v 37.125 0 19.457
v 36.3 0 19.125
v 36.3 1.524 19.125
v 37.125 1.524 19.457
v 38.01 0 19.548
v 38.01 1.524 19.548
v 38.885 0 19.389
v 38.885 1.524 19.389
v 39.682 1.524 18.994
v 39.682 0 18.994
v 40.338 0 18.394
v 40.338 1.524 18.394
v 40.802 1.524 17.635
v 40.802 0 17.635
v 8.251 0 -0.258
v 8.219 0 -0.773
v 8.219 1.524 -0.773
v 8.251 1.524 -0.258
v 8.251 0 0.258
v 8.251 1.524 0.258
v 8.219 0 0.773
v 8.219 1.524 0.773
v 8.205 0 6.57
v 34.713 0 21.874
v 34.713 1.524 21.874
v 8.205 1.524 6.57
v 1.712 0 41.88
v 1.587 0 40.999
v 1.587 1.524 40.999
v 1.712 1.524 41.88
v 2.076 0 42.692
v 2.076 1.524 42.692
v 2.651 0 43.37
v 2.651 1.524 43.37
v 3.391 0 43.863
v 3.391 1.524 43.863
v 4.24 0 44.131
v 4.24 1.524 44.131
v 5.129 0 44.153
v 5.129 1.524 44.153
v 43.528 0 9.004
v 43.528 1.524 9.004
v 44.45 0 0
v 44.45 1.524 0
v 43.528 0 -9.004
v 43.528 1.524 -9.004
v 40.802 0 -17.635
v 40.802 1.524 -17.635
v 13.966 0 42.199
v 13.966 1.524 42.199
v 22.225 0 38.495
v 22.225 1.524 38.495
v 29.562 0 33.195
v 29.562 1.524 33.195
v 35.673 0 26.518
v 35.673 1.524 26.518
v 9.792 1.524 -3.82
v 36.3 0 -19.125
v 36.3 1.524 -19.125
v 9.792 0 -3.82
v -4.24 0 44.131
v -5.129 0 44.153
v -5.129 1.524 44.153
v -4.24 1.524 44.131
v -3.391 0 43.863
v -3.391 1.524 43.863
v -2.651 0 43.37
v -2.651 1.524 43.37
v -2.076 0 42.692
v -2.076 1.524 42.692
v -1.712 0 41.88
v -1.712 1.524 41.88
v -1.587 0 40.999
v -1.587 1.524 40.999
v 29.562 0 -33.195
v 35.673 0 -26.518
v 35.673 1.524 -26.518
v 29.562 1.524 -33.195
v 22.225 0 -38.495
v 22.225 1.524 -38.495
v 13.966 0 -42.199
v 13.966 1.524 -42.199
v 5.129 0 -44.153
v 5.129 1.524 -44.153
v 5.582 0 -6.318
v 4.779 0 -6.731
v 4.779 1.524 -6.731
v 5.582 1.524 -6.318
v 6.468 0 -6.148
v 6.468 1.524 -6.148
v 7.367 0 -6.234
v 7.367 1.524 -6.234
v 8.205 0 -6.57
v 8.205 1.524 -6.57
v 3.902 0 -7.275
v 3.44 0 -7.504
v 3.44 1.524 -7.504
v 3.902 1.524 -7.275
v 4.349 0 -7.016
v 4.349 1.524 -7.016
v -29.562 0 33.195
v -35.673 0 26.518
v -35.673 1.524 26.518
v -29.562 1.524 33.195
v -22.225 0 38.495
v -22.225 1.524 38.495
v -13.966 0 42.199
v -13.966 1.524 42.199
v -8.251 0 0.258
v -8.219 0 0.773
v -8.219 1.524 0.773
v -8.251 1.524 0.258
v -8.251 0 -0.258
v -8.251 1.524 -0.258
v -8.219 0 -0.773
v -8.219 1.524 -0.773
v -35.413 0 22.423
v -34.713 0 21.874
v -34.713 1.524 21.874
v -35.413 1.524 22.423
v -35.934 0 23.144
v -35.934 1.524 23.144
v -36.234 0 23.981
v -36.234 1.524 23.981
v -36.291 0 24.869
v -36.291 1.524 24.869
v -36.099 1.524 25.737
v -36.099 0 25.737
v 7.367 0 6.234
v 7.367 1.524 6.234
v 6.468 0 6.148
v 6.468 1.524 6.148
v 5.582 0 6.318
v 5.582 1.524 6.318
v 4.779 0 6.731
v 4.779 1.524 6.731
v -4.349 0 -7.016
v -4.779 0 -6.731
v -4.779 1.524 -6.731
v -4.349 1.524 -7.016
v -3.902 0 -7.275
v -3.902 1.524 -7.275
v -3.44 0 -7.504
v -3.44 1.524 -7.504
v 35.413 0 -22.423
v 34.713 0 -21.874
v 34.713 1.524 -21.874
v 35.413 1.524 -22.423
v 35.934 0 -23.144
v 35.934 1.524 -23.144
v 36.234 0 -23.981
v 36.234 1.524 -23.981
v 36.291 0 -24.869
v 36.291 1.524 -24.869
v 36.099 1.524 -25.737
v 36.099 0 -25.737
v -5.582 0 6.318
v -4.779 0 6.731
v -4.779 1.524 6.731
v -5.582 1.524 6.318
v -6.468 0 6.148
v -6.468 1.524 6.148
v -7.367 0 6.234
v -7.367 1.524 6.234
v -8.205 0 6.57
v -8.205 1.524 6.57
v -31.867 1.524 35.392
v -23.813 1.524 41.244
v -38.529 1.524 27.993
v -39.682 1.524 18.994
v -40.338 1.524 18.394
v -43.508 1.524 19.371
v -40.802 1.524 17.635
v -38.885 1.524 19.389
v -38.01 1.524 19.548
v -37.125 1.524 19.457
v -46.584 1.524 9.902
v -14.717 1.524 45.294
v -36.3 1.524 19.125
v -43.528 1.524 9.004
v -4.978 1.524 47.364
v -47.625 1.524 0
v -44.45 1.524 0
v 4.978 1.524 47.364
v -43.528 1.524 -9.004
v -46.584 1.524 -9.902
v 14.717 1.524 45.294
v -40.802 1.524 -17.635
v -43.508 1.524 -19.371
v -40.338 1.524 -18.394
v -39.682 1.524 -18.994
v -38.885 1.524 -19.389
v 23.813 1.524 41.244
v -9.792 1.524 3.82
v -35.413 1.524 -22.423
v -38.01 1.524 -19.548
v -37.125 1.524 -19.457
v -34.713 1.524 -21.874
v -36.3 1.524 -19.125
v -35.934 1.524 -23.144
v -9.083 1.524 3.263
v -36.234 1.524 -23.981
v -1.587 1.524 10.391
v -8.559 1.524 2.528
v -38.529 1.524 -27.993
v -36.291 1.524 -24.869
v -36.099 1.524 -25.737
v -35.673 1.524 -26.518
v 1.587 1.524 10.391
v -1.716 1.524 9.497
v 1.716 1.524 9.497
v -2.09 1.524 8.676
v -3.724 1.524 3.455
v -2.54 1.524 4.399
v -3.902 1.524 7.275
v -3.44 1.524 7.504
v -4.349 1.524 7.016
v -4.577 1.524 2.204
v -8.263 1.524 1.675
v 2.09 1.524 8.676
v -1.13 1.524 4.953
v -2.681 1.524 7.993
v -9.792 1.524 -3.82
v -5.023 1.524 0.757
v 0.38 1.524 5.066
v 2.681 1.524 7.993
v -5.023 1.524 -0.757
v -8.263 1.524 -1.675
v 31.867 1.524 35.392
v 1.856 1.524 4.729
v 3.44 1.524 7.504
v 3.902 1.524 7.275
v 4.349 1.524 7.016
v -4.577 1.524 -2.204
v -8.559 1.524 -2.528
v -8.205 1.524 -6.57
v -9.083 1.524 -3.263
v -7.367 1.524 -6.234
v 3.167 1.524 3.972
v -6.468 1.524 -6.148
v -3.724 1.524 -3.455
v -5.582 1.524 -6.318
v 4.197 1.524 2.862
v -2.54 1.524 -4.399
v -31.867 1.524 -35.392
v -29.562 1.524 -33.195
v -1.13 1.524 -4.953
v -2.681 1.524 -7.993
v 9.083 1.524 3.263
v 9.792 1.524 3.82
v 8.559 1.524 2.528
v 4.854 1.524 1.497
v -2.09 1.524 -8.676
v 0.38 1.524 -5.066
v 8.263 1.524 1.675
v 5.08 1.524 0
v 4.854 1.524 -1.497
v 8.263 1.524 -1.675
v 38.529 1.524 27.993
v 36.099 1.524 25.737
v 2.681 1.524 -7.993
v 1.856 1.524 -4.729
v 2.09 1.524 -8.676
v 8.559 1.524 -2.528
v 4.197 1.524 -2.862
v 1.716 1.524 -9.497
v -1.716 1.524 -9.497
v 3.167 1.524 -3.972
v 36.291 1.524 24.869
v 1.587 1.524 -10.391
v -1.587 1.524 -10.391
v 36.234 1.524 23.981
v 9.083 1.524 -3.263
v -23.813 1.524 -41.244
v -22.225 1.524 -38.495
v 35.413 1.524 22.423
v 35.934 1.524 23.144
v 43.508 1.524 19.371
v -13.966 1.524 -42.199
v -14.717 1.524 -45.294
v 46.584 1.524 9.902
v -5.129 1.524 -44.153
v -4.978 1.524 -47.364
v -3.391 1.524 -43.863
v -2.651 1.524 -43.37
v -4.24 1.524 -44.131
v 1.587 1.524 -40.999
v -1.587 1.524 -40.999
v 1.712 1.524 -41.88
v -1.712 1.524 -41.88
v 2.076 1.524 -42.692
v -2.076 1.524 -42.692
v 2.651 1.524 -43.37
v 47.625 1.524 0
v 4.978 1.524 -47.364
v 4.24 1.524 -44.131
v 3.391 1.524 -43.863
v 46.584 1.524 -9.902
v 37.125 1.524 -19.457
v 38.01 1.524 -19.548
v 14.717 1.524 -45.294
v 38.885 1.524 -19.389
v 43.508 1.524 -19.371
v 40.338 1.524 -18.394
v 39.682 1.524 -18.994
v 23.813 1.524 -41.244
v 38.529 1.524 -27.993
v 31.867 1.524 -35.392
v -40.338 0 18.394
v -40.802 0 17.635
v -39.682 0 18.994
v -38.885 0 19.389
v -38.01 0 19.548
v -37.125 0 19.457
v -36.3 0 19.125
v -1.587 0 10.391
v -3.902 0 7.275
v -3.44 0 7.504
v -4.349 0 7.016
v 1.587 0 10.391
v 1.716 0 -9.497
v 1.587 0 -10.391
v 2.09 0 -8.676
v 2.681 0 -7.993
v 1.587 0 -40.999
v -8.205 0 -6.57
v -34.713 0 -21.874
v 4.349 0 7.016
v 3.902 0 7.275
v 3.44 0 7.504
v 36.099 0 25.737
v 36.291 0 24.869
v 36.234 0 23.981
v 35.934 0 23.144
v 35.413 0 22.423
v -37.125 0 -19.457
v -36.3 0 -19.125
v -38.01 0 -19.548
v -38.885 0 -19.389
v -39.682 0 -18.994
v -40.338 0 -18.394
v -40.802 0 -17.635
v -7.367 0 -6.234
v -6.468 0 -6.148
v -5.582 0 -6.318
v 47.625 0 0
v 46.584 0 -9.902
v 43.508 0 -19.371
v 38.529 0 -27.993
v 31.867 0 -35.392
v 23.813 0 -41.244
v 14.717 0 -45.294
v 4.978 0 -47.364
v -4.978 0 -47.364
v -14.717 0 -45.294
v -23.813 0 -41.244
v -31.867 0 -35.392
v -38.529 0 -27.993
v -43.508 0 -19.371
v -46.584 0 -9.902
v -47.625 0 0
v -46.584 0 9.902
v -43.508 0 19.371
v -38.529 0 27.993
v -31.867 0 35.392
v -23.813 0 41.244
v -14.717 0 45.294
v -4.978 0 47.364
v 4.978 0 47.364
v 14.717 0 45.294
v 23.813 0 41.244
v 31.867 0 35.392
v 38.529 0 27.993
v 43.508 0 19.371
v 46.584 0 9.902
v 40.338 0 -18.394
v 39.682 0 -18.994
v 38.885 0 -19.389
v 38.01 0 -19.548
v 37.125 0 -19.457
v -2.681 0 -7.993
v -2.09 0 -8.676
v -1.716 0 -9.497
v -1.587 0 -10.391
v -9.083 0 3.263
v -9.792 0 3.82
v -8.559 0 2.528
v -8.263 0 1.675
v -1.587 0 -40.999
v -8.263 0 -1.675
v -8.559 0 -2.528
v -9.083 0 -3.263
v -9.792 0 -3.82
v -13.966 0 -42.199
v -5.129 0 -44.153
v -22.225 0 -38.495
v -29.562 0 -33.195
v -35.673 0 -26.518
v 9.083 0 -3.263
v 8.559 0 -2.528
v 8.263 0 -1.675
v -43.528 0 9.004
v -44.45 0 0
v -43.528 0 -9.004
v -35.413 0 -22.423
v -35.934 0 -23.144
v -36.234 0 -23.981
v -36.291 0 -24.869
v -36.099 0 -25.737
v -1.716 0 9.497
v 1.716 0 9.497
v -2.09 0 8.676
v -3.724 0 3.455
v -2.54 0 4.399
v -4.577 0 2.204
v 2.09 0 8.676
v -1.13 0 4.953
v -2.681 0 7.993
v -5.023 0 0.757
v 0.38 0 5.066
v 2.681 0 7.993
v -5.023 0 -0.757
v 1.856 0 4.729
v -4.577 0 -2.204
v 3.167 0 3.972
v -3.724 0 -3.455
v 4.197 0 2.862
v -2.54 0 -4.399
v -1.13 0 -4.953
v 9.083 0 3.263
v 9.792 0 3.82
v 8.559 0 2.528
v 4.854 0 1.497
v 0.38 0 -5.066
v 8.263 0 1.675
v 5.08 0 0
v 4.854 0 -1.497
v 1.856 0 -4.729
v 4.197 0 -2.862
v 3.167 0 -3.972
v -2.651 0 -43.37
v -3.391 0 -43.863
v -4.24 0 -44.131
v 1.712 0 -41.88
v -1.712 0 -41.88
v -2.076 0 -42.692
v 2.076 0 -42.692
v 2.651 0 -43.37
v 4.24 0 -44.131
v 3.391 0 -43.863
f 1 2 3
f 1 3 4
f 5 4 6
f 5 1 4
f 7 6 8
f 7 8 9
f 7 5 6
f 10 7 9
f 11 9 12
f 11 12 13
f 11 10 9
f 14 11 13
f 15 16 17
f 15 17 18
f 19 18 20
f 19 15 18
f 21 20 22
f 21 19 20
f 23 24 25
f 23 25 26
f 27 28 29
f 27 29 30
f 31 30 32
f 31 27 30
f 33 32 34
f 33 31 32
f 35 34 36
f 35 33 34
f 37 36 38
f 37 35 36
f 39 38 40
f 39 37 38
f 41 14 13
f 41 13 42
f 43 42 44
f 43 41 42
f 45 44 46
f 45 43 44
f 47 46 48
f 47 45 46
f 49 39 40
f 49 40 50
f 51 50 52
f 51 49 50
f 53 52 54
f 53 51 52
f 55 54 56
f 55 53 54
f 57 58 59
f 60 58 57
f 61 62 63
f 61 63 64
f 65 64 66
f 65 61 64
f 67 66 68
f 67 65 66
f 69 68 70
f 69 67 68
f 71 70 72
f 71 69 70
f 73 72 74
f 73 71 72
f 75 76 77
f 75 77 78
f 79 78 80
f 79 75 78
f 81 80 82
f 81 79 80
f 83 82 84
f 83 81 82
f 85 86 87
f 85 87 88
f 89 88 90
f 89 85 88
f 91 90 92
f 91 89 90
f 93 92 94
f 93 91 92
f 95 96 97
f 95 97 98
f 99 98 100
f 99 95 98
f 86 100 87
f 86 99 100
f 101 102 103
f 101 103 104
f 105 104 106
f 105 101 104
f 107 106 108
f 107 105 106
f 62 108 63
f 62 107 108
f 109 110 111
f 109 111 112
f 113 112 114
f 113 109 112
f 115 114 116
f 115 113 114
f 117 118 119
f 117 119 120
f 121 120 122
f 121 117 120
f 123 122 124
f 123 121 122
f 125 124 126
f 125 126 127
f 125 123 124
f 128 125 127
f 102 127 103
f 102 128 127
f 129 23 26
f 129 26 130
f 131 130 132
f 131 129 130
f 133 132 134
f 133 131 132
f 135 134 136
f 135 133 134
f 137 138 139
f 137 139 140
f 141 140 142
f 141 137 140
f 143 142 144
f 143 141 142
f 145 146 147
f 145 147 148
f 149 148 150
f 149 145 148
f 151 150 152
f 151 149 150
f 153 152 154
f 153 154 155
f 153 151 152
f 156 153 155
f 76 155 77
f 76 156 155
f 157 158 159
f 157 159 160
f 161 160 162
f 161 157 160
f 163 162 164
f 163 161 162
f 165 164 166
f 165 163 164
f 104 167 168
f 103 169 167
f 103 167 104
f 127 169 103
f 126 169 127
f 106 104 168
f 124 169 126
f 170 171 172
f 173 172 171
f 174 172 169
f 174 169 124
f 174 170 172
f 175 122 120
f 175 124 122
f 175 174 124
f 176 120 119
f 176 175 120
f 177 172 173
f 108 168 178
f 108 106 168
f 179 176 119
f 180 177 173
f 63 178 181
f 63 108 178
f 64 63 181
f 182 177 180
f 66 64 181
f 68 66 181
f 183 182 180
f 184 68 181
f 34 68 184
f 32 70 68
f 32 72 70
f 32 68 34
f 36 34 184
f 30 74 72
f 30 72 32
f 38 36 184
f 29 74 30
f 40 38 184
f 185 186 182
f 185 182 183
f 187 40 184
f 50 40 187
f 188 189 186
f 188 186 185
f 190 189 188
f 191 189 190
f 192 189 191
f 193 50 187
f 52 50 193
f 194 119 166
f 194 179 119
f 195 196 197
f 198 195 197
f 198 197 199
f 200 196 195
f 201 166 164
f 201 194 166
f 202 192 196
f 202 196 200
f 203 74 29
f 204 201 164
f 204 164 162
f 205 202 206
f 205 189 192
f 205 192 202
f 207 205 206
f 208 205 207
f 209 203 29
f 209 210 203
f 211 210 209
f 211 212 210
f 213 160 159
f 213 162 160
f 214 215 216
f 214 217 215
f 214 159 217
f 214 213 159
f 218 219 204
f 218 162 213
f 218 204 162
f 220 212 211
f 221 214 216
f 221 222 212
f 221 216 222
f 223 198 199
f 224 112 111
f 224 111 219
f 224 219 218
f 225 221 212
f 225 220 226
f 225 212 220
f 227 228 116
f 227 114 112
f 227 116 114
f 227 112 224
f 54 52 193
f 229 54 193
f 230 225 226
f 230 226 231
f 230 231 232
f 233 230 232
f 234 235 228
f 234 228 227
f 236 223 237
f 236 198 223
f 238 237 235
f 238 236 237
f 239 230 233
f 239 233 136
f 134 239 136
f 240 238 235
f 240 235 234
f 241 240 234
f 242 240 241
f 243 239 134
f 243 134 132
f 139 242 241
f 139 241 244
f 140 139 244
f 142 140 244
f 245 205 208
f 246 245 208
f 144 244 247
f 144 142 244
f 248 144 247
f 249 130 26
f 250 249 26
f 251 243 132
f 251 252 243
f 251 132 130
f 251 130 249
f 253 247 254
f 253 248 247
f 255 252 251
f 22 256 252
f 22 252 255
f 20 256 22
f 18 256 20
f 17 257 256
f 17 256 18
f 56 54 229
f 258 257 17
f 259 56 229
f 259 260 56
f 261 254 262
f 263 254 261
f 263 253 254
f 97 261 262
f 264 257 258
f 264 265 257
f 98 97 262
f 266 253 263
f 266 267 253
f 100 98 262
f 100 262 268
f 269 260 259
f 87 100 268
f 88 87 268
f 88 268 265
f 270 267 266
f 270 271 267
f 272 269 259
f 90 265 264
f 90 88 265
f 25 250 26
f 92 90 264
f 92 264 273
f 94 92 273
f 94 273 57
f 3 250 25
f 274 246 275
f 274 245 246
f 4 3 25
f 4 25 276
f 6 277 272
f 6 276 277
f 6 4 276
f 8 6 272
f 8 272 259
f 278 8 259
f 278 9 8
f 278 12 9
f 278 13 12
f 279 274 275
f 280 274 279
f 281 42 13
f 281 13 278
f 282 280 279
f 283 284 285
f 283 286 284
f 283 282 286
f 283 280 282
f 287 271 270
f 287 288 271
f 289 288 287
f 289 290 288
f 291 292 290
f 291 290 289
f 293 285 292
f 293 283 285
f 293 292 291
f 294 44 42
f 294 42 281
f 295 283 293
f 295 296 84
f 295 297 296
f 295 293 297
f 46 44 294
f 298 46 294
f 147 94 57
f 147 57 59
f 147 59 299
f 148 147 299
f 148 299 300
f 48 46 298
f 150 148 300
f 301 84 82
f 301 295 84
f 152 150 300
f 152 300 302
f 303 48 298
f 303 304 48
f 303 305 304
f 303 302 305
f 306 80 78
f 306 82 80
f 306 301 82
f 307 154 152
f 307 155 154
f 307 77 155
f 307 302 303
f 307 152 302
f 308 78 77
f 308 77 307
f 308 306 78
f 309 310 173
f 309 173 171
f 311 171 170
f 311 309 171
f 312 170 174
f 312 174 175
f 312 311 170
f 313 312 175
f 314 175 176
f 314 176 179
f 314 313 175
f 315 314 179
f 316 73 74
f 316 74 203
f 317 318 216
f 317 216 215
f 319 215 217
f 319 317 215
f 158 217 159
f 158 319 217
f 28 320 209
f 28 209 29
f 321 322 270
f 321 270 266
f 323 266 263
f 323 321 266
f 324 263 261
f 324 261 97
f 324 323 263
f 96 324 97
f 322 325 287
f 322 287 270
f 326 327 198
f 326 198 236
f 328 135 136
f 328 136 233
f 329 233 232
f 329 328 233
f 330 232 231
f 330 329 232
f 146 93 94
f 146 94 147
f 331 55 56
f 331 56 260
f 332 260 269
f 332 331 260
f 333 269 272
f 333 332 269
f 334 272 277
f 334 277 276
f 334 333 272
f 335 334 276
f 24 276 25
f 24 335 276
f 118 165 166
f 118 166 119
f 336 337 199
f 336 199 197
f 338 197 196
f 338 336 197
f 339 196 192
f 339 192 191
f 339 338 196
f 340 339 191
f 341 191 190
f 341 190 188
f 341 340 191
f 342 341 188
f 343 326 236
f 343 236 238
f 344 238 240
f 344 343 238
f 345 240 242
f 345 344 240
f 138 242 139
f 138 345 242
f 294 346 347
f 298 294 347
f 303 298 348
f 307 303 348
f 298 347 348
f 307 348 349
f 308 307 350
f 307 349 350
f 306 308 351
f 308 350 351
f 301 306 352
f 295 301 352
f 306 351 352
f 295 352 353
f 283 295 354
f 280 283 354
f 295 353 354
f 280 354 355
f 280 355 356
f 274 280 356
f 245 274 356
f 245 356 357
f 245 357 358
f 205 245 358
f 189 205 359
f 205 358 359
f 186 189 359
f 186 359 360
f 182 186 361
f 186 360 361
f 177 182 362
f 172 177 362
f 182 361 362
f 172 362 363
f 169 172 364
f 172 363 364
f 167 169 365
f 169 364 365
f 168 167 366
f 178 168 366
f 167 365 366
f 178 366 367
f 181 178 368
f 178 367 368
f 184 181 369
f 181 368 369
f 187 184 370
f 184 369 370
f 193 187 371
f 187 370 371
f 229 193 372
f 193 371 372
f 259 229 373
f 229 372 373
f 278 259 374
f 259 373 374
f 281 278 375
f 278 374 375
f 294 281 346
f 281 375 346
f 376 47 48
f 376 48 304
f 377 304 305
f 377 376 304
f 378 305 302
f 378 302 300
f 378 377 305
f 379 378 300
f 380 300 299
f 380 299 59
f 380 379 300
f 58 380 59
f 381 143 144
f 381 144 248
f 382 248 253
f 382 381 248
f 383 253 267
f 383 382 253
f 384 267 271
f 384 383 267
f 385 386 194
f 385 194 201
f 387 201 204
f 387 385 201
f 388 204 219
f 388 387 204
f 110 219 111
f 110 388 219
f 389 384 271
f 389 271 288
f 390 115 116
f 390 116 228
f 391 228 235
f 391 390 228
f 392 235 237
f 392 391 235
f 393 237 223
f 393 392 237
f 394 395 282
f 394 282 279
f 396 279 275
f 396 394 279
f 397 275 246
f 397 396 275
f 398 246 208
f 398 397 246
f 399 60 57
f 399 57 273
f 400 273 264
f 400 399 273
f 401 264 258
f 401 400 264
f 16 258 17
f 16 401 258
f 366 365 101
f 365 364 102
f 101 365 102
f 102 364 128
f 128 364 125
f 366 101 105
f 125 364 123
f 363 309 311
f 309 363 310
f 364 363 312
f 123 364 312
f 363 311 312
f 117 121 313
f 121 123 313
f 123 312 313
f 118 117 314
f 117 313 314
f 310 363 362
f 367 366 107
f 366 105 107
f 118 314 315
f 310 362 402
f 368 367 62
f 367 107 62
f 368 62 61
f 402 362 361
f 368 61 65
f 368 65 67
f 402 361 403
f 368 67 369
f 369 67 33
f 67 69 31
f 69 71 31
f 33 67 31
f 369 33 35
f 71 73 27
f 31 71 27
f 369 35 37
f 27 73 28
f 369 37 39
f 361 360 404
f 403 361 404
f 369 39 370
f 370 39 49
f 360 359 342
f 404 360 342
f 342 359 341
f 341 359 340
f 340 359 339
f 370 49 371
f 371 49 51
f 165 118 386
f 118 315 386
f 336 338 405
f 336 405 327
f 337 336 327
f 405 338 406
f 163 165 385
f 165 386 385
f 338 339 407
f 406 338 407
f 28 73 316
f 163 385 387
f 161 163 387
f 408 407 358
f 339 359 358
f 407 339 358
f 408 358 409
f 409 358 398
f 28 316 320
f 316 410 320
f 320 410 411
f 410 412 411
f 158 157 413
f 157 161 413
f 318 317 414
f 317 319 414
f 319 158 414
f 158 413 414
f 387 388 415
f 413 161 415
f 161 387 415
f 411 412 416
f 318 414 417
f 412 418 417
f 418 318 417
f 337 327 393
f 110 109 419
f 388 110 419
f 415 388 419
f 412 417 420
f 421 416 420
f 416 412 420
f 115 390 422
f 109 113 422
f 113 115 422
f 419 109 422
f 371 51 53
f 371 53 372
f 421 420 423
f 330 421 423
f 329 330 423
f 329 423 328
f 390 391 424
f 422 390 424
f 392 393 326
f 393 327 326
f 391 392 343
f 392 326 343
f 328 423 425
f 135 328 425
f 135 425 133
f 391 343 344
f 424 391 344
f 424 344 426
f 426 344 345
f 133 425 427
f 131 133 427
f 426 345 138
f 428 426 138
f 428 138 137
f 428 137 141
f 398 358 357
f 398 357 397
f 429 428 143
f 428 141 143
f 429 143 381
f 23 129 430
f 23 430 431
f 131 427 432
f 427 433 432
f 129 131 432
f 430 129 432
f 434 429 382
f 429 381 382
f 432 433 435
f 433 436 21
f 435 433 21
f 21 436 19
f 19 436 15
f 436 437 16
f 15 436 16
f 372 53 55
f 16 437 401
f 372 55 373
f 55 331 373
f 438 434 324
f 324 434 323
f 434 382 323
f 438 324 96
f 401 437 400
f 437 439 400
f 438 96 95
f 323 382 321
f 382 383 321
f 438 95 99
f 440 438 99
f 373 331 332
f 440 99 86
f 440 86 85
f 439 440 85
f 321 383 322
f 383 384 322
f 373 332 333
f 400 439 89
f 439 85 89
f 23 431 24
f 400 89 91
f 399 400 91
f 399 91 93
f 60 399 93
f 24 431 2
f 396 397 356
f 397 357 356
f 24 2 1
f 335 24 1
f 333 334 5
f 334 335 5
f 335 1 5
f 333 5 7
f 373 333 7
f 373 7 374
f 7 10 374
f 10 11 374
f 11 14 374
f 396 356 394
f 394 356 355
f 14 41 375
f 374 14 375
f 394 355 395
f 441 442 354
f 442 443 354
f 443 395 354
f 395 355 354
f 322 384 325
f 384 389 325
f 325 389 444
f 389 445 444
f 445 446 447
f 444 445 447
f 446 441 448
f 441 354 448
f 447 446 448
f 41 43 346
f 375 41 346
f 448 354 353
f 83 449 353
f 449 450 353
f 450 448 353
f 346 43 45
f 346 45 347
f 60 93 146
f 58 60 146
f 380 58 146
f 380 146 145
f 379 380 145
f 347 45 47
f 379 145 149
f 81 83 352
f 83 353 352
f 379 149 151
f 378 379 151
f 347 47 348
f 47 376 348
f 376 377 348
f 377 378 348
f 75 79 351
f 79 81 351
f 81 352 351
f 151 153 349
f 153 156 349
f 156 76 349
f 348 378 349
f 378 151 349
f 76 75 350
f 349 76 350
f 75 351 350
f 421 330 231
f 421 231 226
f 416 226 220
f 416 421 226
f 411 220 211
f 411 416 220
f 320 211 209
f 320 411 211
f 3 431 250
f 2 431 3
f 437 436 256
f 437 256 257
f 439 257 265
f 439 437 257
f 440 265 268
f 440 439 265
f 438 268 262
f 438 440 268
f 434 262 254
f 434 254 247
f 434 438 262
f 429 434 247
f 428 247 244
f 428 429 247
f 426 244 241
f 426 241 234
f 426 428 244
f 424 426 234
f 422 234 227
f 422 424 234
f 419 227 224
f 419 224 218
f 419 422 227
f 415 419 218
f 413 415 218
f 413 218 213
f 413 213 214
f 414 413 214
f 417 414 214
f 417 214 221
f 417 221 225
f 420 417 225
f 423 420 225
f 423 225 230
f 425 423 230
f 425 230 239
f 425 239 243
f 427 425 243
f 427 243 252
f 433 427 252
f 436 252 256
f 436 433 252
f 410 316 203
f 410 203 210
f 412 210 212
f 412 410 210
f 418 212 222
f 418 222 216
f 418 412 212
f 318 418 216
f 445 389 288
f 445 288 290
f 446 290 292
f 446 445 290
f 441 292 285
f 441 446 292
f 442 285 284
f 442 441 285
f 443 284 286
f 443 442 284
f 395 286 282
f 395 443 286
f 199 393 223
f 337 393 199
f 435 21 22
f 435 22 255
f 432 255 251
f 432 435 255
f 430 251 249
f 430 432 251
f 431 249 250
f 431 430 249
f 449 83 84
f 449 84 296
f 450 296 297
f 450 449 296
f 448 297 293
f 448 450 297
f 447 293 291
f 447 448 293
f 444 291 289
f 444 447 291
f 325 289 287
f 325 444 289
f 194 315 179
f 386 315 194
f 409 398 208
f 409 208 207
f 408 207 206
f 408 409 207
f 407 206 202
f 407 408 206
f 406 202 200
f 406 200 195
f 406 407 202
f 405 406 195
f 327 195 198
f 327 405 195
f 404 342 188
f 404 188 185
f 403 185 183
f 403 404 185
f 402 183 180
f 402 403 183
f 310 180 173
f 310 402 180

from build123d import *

# Parameters (mm, degrees)
SKETCH1_R           = 47.625
SKETCH1_R_2         = 5.08
BOSS_EXTRUDE1_DEPTH = 1.524


with BuildPart() as part:
    # Sketch1 → Boss-Extrude1 (new body)
    with BuildSketch(Plane(origin=(0, 0, 0), x_dir=(1, 0, 0), z_dir=(0, 1, 0))):
        Circle(SKETCH1_R)
        Circle(SKETCH1_R_2, mode=Mode.SUBTRACT)
        with BuildLine():
            Line((1.5875, 40.999319735), (1.5875, 10.390548289))
            ThreePointArc((1.5875, 10.390548289), (2.090339318, 8.675852313), (3.439583333, 7.504284876))
            ThreePointArc((3.439583333, 7.504284876), (4.1275, 7.149039708), (4.779109673, 6.730908983))
            ThreePointArc((4.779109673, 6.730908983), (6.468338843, 6.148213109), (8.204728778, 6.570089473))
            Line((8.204728778, 6.570089473), (34.712702429, 21.874475196))
            ThreePointArc((34.712702429, 21.874475196), (36.234379788, 23.980956457), (35.673294923, 26.518267842))
            ThreePointArc((35.673294923, 26.518267842), (22.225, 38.494829198), (5.128846154, 44.153113561))
            ThreePointArc((5.128846154, 44.153113561), (2.650927605, 43.370371616), (1.5875, 40.999319735))
        make_face(mode=Mode.SUBTRACT)
        with BuildLine():
            Line((36.300202429, 19.124844539), (9.792228778, 3.820458816))
            ThreePointArc((9.792228778, 3.820458816), (8.558678162, 2.527639204), (8.218693006, 0.773375893))
            ThreePointArc((8.218693006, 0.773375893), (8.255, 0), (8.218693006, -0.773375893))
            ThreePointArc((8.218693006, -0.773375893), (8.558678162, -2.527639204), (9.792228778, -3.820458816))
            Line((9.792228778, -3.820458816), (36.300202429, -19.124844539))
            ThreePointArc((36.300202429, -19.124844539), (38.885307393, -19.389415159), (40.802141077, -17.634845719))
            ThreePointArc((40.802141077, -17.634845719), (44.45, 0), (40.802141077, 17.634845719))
            ThreePointArc((40.802141077, 17.634845719), (38.885307393, 19.389415159), (36.300202429, 19.124844539))
        make_face(mode=Mode.SUBTRACT)
        with BuildLine():
            Line((34.712702429, -21.874475196), (8.204728778, -6.570089473))
            ThreePointArc((8.204728778, -6.570089473), (6.468338843, -6.148213109), (4.779109673, -6.730908983))
            ThreePointArc((4.779109673, -6.730908983), (4.1275, -7.149039708), (3.439583333, -7.504284876))
            ThreePointArc((3.439583333, -7.504284876), (2.090339318, -8.675852313), (1.5875, -10.390548289))
            Line((1.5875, -10.390548289), (1.5875, -40.999319735))
            ThreePointArc((1.5875, -40.999319735), (2.650927605, -43.370371616), (5.128846154, -44.153113561))
            ThreePointArc((5.128846154, -44.153113561), (22.225, -38.494829198), (35.673294923, -26.518267842))
            ThreePointArc((35.673294923, -26.518267842), (36.234379788, -23.980956457), (34.712702429, -21.874475196))
        make_face(mode=Mode.SUBTRACT)
        with BuildLine():
            Line((-1.5875, -40.999319735), (-1.5875, -10.390548289))
            ThreePointArc((-1.5875, -10.390548289), (-2.090339318, -8.675852313), (-3.439583333, -7.504284876))
            ThreePointArc((-3.439583333, -7.504284876), (-4.1275, -7.149039708), (-4.779109673, -6.730908983))
            ThreePointArc((-4.779109673, -6.730908983), (-6.468338843, -6.148213109), (-8.204728778, -6.570089473))
            Line((-8.204728778, -6.570089473), (-34.712702429, -21.874475196))
            ThreePointArc((-34.712702429, -21.874475196), (-36.234379788, -23.980956457), (-35.673294923, -26.518267842))
            ThreePointArc((-35.673294923, -26.518267842), (-22.225, -38.494829198), (-5.128846154, -44.153113561))
            ThreePointArc((-5.128846154, -44.153113561), (-2.650927605, -43.370371616), (-1.5875, -40.999319735))
        make_face(mode=Mode.SUBTRACT)
        with BuildLine():
            Line((-36.300202429, -19.124844539), (-9.792228778, -3.820458816))
            ThreePointArc((-9.792228778, -3.820458816), (-8.558678162, -2.527639204), (-8.218693006, -0.773375893))
            ThreePointArc((-8.218693006, -0.773375893), (-8.255, 0), (-8.218693006, 0.773375893))
            ThreePointArc((-8.218693006, 0.773375893), (-8.558678162, 2.527639204), (-9.792228778, 3.820458816))
            Line((-9.792228778, 3.820458816), (-36.300202429, 19.124844539))
            ThreePointArc((-36.300202429, 19.124844539), (-38.885307393, 19.389415159), (-40.802141077, 17.634845719))
            ThreePointArc((-40.802141077, 17.634845719), (-44.45, 0), (-40.802141077, -17.634845719))
            ThreePointArc((-40.802141077, -17.634845719), (-38.885307393, -19.389415159), (-36.300202429, -19.124844539))
        make_face(mode=Mode.SUBTRACT)
        with BuildLine():
            Line((-34.712702429, 21.874475196), (-8.204728778, 6.570089473))
            ThreePointArc((-8.204728778, 6.570089473), (-6.468338843, 6.148213109), (-4.779109673, 6.730908983))
            ThreePointArc((-4.779109673, 6.730908983), (-4.1275, 7.149039708), (-3.439583333, 7.504284876))
            ThreePointArc((-3.439583333, 7.504284876), (-2.090339318, 8.675852313), (-1.5875, 10.390548289))
            Line((-1.5875, 10.390548289), (-1.5875, 40.999319735))
            ThreePointArc((-1.5875, 40.999319735), (-2.650927605, 43.370371616), (-5.128846154, 44.153113561))
            ThreePointArc((-5.128846154, 44.153113561), (-22.225, 38.494829198), (-35.673294923, 26.518267842))
            ThreePointArc((-35.673294923, 26.518267842), (-36.234379788, 23.980956457), (-34.712702429, 21.874475196))
        make_face(mode=Mode.SUBTRACT)
    extrude(amount=BOSS_EXTRUDE1_DEPTH)


solid = part.part
